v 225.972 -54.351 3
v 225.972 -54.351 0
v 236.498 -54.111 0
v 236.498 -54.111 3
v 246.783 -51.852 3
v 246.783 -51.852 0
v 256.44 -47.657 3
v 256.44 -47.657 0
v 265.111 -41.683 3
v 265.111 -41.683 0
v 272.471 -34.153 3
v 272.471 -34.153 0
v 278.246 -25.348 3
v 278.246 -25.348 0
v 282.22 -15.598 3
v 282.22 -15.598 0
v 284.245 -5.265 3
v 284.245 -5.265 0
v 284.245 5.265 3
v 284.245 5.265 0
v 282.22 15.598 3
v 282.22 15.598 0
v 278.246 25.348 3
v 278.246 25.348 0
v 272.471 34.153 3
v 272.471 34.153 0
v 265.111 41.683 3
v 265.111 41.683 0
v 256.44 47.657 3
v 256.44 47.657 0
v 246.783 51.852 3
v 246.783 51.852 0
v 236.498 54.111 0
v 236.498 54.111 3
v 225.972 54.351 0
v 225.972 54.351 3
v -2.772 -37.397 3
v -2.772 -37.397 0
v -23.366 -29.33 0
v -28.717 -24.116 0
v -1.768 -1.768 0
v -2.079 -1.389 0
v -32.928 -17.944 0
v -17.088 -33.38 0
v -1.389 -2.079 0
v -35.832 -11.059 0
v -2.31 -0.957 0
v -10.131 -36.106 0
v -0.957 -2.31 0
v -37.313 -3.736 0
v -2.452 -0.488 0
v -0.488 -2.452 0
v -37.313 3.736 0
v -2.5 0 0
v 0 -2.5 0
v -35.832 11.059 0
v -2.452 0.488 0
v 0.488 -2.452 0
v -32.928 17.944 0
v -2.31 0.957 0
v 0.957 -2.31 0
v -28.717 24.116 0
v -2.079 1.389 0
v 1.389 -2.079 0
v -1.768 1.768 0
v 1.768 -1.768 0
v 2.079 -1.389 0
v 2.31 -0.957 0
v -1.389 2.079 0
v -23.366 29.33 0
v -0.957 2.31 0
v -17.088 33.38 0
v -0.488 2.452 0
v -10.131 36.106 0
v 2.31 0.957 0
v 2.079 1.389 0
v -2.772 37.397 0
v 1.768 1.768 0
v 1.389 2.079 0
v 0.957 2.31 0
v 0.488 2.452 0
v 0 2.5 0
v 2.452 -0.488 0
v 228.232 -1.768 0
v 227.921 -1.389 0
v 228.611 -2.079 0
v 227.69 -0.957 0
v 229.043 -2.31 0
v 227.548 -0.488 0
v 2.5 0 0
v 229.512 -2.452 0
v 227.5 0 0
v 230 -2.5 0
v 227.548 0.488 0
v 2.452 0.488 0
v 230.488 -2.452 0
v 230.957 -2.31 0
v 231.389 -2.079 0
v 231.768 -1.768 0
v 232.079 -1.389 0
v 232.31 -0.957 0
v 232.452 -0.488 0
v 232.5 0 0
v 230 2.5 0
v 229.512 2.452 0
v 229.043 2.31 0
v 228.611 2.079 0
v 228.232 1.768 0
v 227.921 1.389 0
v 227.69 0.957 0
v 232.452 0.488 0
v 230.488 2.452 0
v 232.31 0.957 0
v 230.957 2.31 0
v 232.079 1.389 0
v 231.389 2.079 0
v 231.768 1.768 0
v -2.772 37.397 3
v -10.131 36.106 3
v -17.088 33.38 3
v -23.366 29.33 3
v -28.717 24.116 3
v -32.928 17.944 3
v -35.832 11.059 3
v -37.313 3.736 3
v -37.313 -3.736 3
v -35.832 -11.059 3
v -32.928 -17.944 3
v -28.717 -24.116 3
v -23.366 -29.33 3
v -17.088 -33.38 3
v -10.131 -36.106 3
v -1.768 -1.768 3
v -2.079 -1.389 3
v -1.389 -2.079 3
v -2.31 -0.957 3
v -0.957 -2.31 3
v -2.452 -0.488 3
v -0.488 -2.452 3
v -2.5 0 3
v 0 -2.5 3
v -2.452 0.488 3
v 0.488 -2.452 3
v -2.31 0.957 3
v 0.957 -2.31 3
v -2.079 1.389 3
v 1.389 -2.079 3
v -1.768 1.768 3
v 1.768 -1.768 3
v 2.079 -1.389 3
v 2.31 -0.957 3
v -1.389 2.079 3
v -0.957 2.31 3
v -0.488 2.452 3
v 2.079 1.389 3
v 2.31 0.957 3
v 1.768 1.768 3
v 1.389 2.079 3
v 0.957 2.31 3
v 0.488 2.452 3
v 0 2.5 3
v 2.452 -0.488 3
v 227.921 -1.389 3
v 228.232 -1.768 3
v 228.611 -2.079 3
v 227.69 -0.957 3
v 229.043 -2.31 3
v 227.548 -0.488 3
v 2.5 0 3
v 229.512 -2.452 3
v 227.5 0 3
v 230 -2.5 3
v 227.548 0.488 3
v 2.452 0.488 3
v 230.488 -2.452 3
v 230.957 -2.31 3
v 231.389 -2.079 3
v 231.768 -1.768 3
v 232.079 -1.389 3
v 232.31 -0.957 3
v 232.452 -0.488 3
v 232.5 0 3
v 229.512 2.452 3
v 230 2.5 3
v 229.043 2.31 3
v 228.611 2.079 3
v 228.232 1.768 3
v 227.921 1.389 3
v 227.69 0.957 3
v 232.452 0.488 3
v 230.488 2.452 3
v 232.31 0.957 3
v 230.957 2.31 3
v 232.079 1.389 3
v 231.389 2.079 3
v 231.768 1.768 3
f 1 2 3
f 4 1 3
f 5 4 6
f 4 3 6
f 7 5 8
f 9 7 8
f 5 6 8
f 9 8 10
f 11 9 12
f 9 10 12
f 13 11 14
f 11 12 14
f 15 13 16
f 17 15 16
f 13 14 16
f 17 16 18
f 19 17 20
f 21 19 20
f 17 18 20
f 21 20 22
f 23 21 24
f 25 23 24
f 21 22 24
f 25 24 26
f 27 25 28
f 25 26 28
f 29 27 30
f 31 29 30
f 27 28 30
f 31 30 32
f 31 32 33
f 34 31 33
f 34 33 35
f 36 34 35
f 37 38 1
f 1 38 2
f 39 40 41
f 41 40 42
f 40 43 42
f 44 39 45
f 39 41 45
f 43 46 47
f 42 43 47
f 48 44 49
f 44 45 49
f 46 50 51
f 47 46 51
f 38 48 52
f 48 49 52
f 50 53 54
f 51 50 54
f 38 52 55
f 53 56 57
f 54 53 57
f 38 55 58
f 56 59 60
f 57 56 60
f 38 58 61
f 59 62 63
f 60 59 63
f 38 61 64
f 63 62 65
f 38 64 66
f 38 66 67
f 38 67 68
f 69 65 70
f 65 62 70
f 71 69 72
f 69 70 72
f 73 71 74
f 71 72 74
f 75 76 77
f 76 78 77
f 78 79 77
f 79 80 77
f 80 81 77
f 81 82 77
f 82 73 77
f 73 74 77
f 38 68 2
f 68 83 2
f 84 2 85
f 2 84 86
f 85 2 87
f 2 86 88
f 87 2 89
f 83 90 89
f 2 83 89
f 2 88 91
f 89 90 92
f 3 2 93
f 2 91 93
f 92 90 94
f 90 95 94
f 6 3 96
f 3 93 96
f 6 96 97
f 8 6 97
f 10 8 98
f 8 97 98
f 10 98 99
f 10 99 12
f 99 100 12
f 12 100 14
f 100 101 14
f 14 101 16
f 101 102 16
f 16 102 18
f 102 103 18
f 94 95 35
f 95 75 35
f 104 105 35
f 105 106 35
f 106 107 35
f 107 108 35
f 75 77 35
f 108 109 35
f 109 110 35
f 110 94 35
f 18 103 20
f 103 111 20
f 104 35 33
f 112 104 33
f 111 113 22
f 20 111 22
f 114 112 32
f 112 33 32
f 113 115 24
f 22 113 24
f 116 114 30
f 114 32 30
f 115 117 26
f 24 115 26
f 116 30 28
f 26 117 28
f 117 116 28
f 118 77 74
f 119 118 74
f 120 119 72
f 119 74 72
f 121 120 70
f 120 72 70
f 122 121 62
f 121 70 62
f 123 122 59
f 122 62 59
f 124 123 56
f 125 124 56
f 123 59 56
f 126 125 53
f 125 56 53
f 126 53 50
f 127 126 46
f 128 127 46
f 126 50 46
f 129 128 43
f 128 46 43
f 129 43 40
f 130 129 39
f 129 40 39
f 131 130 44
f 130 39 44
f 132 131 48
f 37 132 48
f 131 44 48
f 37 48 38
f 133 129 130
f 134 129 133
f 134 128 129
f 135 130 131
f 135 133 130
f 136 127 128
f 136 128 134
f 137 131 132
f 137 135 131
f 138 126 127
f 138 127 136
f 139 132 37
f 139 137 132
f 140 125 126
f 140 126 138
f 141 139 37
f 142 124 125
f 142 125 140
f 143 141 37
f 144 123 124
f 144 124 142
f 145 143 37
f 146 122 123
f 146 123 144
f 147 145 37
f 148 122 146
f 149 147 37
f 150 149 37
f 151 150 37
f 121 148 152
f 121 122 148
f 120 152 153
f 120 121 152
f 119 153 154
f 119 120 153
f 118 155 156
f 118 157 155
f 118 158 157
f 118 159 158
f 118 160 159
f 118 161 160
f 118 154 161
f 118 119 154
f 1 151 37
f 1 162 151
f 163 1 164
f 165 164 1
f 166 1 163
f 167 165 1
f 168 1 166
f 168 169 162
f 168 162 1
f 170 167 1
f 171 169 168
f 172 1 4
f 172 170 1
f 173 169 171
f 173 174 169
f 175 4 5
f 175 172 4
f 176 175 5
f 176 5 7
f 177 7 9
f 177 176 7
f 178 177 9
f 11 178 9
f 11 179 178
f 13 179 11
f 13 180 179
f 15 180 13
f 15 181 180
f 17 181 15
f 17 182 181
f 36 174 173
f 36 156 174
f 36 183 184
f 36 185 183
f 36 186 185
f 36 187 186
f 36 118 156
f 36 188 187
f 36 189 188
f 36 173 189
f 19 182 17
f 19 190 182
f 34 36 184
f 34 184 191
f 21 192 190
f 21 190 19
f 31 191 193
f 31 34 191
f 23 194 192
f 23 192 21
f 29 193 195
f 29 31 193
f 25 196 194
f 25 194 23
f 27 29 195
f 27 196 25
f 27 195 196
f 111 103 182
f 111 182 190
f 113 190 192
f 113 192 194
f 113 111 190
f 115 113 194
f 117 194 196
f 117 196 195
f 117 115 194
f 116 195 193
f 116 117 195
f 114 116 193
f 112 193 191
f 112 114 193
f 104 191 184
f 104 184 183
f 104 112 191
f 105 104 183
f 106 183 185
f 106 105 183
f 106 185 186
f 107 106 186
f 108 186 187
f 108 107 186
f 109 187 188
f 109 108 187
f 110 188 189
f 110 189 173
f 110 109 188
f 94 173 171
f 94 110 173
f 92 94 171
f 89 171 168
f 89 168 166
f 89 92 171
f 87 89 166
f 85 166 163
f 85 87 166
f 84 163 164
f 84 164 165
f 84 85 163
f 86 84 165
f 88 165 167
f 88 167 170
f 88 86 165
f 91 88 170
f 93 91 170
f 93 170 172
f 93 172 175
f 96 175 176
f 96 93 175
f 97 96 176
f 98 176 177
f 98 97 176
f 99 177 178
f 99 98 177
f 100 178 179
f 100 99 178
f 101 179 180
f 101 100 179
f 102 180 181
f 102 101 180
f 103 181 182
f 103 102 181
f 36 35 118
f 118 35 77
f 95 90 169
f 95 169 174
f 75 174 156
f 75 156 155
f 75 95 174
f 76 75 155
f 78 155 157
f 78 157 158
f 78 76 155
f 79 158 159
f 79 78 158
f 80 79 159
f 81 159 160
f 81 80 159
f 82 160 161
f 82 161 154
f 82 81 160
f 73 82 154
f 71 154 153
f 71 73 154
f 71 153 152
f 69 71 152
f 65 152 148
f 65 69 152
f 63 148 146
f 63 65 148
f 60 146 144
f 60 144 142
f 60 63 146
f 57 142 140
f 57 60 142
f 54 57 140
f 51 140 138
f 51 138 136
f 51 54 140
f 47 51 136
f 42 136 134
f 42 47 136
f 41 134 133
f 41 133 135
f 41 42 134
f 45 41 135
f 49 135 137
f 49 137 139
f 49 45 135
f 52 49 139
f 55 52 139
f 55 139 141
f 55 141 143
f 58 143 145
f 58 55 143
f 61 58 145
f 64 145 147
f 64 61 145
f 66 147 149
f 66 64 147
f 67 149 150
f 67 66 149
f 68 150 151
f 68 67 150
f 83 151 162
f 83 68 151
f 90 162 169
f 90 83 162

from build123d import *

# Parameters (mm, degrees)
SKETCH1_R           = 37.5
SKETCH1_R_2         = 2.5
SKETCH1_R_3         = 54.5
BOSS_EXTRUDE1_DEPTH = 3


with BuildPart() as part:
    # Sketch1 → Boss-Extrude1 (new body)
    with BuildSketch(Plane.XY):
        Circle(SKETCH1_R)
        Circle(SKETCH1_R_2, mode=Mode.SUBTRACT)
        with BuildLine():
            Line((225.97173913, 54.350925607), (-2.77173913, 37.397425877))
            ThreePointArc((-2.77173913, 37.397425877), (25.517736798, 27.478993953), (37.5, 0))
            ThreePointArc((37.5, 0), (25.517736798, -27.478993953), (-2.77173913, -37.397425877))
            Line((-2.77173913, -37.397425877), (225.97173913, -54.350925607))
            ThreePointArc((225.97173913, -54.350925607), (175.5, 0), (225.97173913, 54.350925607))
        make_face()
        with Locations((230, 0)):
            Circle(SKETCH1_R_3)
        with Locations((230, 0)):
            Circle(SKETCH1_R_2, mode=Mode.SUBTRACT)
    extrude(amount=BOSS_EXTRUDE1_DEPTH)


solid = part.part
